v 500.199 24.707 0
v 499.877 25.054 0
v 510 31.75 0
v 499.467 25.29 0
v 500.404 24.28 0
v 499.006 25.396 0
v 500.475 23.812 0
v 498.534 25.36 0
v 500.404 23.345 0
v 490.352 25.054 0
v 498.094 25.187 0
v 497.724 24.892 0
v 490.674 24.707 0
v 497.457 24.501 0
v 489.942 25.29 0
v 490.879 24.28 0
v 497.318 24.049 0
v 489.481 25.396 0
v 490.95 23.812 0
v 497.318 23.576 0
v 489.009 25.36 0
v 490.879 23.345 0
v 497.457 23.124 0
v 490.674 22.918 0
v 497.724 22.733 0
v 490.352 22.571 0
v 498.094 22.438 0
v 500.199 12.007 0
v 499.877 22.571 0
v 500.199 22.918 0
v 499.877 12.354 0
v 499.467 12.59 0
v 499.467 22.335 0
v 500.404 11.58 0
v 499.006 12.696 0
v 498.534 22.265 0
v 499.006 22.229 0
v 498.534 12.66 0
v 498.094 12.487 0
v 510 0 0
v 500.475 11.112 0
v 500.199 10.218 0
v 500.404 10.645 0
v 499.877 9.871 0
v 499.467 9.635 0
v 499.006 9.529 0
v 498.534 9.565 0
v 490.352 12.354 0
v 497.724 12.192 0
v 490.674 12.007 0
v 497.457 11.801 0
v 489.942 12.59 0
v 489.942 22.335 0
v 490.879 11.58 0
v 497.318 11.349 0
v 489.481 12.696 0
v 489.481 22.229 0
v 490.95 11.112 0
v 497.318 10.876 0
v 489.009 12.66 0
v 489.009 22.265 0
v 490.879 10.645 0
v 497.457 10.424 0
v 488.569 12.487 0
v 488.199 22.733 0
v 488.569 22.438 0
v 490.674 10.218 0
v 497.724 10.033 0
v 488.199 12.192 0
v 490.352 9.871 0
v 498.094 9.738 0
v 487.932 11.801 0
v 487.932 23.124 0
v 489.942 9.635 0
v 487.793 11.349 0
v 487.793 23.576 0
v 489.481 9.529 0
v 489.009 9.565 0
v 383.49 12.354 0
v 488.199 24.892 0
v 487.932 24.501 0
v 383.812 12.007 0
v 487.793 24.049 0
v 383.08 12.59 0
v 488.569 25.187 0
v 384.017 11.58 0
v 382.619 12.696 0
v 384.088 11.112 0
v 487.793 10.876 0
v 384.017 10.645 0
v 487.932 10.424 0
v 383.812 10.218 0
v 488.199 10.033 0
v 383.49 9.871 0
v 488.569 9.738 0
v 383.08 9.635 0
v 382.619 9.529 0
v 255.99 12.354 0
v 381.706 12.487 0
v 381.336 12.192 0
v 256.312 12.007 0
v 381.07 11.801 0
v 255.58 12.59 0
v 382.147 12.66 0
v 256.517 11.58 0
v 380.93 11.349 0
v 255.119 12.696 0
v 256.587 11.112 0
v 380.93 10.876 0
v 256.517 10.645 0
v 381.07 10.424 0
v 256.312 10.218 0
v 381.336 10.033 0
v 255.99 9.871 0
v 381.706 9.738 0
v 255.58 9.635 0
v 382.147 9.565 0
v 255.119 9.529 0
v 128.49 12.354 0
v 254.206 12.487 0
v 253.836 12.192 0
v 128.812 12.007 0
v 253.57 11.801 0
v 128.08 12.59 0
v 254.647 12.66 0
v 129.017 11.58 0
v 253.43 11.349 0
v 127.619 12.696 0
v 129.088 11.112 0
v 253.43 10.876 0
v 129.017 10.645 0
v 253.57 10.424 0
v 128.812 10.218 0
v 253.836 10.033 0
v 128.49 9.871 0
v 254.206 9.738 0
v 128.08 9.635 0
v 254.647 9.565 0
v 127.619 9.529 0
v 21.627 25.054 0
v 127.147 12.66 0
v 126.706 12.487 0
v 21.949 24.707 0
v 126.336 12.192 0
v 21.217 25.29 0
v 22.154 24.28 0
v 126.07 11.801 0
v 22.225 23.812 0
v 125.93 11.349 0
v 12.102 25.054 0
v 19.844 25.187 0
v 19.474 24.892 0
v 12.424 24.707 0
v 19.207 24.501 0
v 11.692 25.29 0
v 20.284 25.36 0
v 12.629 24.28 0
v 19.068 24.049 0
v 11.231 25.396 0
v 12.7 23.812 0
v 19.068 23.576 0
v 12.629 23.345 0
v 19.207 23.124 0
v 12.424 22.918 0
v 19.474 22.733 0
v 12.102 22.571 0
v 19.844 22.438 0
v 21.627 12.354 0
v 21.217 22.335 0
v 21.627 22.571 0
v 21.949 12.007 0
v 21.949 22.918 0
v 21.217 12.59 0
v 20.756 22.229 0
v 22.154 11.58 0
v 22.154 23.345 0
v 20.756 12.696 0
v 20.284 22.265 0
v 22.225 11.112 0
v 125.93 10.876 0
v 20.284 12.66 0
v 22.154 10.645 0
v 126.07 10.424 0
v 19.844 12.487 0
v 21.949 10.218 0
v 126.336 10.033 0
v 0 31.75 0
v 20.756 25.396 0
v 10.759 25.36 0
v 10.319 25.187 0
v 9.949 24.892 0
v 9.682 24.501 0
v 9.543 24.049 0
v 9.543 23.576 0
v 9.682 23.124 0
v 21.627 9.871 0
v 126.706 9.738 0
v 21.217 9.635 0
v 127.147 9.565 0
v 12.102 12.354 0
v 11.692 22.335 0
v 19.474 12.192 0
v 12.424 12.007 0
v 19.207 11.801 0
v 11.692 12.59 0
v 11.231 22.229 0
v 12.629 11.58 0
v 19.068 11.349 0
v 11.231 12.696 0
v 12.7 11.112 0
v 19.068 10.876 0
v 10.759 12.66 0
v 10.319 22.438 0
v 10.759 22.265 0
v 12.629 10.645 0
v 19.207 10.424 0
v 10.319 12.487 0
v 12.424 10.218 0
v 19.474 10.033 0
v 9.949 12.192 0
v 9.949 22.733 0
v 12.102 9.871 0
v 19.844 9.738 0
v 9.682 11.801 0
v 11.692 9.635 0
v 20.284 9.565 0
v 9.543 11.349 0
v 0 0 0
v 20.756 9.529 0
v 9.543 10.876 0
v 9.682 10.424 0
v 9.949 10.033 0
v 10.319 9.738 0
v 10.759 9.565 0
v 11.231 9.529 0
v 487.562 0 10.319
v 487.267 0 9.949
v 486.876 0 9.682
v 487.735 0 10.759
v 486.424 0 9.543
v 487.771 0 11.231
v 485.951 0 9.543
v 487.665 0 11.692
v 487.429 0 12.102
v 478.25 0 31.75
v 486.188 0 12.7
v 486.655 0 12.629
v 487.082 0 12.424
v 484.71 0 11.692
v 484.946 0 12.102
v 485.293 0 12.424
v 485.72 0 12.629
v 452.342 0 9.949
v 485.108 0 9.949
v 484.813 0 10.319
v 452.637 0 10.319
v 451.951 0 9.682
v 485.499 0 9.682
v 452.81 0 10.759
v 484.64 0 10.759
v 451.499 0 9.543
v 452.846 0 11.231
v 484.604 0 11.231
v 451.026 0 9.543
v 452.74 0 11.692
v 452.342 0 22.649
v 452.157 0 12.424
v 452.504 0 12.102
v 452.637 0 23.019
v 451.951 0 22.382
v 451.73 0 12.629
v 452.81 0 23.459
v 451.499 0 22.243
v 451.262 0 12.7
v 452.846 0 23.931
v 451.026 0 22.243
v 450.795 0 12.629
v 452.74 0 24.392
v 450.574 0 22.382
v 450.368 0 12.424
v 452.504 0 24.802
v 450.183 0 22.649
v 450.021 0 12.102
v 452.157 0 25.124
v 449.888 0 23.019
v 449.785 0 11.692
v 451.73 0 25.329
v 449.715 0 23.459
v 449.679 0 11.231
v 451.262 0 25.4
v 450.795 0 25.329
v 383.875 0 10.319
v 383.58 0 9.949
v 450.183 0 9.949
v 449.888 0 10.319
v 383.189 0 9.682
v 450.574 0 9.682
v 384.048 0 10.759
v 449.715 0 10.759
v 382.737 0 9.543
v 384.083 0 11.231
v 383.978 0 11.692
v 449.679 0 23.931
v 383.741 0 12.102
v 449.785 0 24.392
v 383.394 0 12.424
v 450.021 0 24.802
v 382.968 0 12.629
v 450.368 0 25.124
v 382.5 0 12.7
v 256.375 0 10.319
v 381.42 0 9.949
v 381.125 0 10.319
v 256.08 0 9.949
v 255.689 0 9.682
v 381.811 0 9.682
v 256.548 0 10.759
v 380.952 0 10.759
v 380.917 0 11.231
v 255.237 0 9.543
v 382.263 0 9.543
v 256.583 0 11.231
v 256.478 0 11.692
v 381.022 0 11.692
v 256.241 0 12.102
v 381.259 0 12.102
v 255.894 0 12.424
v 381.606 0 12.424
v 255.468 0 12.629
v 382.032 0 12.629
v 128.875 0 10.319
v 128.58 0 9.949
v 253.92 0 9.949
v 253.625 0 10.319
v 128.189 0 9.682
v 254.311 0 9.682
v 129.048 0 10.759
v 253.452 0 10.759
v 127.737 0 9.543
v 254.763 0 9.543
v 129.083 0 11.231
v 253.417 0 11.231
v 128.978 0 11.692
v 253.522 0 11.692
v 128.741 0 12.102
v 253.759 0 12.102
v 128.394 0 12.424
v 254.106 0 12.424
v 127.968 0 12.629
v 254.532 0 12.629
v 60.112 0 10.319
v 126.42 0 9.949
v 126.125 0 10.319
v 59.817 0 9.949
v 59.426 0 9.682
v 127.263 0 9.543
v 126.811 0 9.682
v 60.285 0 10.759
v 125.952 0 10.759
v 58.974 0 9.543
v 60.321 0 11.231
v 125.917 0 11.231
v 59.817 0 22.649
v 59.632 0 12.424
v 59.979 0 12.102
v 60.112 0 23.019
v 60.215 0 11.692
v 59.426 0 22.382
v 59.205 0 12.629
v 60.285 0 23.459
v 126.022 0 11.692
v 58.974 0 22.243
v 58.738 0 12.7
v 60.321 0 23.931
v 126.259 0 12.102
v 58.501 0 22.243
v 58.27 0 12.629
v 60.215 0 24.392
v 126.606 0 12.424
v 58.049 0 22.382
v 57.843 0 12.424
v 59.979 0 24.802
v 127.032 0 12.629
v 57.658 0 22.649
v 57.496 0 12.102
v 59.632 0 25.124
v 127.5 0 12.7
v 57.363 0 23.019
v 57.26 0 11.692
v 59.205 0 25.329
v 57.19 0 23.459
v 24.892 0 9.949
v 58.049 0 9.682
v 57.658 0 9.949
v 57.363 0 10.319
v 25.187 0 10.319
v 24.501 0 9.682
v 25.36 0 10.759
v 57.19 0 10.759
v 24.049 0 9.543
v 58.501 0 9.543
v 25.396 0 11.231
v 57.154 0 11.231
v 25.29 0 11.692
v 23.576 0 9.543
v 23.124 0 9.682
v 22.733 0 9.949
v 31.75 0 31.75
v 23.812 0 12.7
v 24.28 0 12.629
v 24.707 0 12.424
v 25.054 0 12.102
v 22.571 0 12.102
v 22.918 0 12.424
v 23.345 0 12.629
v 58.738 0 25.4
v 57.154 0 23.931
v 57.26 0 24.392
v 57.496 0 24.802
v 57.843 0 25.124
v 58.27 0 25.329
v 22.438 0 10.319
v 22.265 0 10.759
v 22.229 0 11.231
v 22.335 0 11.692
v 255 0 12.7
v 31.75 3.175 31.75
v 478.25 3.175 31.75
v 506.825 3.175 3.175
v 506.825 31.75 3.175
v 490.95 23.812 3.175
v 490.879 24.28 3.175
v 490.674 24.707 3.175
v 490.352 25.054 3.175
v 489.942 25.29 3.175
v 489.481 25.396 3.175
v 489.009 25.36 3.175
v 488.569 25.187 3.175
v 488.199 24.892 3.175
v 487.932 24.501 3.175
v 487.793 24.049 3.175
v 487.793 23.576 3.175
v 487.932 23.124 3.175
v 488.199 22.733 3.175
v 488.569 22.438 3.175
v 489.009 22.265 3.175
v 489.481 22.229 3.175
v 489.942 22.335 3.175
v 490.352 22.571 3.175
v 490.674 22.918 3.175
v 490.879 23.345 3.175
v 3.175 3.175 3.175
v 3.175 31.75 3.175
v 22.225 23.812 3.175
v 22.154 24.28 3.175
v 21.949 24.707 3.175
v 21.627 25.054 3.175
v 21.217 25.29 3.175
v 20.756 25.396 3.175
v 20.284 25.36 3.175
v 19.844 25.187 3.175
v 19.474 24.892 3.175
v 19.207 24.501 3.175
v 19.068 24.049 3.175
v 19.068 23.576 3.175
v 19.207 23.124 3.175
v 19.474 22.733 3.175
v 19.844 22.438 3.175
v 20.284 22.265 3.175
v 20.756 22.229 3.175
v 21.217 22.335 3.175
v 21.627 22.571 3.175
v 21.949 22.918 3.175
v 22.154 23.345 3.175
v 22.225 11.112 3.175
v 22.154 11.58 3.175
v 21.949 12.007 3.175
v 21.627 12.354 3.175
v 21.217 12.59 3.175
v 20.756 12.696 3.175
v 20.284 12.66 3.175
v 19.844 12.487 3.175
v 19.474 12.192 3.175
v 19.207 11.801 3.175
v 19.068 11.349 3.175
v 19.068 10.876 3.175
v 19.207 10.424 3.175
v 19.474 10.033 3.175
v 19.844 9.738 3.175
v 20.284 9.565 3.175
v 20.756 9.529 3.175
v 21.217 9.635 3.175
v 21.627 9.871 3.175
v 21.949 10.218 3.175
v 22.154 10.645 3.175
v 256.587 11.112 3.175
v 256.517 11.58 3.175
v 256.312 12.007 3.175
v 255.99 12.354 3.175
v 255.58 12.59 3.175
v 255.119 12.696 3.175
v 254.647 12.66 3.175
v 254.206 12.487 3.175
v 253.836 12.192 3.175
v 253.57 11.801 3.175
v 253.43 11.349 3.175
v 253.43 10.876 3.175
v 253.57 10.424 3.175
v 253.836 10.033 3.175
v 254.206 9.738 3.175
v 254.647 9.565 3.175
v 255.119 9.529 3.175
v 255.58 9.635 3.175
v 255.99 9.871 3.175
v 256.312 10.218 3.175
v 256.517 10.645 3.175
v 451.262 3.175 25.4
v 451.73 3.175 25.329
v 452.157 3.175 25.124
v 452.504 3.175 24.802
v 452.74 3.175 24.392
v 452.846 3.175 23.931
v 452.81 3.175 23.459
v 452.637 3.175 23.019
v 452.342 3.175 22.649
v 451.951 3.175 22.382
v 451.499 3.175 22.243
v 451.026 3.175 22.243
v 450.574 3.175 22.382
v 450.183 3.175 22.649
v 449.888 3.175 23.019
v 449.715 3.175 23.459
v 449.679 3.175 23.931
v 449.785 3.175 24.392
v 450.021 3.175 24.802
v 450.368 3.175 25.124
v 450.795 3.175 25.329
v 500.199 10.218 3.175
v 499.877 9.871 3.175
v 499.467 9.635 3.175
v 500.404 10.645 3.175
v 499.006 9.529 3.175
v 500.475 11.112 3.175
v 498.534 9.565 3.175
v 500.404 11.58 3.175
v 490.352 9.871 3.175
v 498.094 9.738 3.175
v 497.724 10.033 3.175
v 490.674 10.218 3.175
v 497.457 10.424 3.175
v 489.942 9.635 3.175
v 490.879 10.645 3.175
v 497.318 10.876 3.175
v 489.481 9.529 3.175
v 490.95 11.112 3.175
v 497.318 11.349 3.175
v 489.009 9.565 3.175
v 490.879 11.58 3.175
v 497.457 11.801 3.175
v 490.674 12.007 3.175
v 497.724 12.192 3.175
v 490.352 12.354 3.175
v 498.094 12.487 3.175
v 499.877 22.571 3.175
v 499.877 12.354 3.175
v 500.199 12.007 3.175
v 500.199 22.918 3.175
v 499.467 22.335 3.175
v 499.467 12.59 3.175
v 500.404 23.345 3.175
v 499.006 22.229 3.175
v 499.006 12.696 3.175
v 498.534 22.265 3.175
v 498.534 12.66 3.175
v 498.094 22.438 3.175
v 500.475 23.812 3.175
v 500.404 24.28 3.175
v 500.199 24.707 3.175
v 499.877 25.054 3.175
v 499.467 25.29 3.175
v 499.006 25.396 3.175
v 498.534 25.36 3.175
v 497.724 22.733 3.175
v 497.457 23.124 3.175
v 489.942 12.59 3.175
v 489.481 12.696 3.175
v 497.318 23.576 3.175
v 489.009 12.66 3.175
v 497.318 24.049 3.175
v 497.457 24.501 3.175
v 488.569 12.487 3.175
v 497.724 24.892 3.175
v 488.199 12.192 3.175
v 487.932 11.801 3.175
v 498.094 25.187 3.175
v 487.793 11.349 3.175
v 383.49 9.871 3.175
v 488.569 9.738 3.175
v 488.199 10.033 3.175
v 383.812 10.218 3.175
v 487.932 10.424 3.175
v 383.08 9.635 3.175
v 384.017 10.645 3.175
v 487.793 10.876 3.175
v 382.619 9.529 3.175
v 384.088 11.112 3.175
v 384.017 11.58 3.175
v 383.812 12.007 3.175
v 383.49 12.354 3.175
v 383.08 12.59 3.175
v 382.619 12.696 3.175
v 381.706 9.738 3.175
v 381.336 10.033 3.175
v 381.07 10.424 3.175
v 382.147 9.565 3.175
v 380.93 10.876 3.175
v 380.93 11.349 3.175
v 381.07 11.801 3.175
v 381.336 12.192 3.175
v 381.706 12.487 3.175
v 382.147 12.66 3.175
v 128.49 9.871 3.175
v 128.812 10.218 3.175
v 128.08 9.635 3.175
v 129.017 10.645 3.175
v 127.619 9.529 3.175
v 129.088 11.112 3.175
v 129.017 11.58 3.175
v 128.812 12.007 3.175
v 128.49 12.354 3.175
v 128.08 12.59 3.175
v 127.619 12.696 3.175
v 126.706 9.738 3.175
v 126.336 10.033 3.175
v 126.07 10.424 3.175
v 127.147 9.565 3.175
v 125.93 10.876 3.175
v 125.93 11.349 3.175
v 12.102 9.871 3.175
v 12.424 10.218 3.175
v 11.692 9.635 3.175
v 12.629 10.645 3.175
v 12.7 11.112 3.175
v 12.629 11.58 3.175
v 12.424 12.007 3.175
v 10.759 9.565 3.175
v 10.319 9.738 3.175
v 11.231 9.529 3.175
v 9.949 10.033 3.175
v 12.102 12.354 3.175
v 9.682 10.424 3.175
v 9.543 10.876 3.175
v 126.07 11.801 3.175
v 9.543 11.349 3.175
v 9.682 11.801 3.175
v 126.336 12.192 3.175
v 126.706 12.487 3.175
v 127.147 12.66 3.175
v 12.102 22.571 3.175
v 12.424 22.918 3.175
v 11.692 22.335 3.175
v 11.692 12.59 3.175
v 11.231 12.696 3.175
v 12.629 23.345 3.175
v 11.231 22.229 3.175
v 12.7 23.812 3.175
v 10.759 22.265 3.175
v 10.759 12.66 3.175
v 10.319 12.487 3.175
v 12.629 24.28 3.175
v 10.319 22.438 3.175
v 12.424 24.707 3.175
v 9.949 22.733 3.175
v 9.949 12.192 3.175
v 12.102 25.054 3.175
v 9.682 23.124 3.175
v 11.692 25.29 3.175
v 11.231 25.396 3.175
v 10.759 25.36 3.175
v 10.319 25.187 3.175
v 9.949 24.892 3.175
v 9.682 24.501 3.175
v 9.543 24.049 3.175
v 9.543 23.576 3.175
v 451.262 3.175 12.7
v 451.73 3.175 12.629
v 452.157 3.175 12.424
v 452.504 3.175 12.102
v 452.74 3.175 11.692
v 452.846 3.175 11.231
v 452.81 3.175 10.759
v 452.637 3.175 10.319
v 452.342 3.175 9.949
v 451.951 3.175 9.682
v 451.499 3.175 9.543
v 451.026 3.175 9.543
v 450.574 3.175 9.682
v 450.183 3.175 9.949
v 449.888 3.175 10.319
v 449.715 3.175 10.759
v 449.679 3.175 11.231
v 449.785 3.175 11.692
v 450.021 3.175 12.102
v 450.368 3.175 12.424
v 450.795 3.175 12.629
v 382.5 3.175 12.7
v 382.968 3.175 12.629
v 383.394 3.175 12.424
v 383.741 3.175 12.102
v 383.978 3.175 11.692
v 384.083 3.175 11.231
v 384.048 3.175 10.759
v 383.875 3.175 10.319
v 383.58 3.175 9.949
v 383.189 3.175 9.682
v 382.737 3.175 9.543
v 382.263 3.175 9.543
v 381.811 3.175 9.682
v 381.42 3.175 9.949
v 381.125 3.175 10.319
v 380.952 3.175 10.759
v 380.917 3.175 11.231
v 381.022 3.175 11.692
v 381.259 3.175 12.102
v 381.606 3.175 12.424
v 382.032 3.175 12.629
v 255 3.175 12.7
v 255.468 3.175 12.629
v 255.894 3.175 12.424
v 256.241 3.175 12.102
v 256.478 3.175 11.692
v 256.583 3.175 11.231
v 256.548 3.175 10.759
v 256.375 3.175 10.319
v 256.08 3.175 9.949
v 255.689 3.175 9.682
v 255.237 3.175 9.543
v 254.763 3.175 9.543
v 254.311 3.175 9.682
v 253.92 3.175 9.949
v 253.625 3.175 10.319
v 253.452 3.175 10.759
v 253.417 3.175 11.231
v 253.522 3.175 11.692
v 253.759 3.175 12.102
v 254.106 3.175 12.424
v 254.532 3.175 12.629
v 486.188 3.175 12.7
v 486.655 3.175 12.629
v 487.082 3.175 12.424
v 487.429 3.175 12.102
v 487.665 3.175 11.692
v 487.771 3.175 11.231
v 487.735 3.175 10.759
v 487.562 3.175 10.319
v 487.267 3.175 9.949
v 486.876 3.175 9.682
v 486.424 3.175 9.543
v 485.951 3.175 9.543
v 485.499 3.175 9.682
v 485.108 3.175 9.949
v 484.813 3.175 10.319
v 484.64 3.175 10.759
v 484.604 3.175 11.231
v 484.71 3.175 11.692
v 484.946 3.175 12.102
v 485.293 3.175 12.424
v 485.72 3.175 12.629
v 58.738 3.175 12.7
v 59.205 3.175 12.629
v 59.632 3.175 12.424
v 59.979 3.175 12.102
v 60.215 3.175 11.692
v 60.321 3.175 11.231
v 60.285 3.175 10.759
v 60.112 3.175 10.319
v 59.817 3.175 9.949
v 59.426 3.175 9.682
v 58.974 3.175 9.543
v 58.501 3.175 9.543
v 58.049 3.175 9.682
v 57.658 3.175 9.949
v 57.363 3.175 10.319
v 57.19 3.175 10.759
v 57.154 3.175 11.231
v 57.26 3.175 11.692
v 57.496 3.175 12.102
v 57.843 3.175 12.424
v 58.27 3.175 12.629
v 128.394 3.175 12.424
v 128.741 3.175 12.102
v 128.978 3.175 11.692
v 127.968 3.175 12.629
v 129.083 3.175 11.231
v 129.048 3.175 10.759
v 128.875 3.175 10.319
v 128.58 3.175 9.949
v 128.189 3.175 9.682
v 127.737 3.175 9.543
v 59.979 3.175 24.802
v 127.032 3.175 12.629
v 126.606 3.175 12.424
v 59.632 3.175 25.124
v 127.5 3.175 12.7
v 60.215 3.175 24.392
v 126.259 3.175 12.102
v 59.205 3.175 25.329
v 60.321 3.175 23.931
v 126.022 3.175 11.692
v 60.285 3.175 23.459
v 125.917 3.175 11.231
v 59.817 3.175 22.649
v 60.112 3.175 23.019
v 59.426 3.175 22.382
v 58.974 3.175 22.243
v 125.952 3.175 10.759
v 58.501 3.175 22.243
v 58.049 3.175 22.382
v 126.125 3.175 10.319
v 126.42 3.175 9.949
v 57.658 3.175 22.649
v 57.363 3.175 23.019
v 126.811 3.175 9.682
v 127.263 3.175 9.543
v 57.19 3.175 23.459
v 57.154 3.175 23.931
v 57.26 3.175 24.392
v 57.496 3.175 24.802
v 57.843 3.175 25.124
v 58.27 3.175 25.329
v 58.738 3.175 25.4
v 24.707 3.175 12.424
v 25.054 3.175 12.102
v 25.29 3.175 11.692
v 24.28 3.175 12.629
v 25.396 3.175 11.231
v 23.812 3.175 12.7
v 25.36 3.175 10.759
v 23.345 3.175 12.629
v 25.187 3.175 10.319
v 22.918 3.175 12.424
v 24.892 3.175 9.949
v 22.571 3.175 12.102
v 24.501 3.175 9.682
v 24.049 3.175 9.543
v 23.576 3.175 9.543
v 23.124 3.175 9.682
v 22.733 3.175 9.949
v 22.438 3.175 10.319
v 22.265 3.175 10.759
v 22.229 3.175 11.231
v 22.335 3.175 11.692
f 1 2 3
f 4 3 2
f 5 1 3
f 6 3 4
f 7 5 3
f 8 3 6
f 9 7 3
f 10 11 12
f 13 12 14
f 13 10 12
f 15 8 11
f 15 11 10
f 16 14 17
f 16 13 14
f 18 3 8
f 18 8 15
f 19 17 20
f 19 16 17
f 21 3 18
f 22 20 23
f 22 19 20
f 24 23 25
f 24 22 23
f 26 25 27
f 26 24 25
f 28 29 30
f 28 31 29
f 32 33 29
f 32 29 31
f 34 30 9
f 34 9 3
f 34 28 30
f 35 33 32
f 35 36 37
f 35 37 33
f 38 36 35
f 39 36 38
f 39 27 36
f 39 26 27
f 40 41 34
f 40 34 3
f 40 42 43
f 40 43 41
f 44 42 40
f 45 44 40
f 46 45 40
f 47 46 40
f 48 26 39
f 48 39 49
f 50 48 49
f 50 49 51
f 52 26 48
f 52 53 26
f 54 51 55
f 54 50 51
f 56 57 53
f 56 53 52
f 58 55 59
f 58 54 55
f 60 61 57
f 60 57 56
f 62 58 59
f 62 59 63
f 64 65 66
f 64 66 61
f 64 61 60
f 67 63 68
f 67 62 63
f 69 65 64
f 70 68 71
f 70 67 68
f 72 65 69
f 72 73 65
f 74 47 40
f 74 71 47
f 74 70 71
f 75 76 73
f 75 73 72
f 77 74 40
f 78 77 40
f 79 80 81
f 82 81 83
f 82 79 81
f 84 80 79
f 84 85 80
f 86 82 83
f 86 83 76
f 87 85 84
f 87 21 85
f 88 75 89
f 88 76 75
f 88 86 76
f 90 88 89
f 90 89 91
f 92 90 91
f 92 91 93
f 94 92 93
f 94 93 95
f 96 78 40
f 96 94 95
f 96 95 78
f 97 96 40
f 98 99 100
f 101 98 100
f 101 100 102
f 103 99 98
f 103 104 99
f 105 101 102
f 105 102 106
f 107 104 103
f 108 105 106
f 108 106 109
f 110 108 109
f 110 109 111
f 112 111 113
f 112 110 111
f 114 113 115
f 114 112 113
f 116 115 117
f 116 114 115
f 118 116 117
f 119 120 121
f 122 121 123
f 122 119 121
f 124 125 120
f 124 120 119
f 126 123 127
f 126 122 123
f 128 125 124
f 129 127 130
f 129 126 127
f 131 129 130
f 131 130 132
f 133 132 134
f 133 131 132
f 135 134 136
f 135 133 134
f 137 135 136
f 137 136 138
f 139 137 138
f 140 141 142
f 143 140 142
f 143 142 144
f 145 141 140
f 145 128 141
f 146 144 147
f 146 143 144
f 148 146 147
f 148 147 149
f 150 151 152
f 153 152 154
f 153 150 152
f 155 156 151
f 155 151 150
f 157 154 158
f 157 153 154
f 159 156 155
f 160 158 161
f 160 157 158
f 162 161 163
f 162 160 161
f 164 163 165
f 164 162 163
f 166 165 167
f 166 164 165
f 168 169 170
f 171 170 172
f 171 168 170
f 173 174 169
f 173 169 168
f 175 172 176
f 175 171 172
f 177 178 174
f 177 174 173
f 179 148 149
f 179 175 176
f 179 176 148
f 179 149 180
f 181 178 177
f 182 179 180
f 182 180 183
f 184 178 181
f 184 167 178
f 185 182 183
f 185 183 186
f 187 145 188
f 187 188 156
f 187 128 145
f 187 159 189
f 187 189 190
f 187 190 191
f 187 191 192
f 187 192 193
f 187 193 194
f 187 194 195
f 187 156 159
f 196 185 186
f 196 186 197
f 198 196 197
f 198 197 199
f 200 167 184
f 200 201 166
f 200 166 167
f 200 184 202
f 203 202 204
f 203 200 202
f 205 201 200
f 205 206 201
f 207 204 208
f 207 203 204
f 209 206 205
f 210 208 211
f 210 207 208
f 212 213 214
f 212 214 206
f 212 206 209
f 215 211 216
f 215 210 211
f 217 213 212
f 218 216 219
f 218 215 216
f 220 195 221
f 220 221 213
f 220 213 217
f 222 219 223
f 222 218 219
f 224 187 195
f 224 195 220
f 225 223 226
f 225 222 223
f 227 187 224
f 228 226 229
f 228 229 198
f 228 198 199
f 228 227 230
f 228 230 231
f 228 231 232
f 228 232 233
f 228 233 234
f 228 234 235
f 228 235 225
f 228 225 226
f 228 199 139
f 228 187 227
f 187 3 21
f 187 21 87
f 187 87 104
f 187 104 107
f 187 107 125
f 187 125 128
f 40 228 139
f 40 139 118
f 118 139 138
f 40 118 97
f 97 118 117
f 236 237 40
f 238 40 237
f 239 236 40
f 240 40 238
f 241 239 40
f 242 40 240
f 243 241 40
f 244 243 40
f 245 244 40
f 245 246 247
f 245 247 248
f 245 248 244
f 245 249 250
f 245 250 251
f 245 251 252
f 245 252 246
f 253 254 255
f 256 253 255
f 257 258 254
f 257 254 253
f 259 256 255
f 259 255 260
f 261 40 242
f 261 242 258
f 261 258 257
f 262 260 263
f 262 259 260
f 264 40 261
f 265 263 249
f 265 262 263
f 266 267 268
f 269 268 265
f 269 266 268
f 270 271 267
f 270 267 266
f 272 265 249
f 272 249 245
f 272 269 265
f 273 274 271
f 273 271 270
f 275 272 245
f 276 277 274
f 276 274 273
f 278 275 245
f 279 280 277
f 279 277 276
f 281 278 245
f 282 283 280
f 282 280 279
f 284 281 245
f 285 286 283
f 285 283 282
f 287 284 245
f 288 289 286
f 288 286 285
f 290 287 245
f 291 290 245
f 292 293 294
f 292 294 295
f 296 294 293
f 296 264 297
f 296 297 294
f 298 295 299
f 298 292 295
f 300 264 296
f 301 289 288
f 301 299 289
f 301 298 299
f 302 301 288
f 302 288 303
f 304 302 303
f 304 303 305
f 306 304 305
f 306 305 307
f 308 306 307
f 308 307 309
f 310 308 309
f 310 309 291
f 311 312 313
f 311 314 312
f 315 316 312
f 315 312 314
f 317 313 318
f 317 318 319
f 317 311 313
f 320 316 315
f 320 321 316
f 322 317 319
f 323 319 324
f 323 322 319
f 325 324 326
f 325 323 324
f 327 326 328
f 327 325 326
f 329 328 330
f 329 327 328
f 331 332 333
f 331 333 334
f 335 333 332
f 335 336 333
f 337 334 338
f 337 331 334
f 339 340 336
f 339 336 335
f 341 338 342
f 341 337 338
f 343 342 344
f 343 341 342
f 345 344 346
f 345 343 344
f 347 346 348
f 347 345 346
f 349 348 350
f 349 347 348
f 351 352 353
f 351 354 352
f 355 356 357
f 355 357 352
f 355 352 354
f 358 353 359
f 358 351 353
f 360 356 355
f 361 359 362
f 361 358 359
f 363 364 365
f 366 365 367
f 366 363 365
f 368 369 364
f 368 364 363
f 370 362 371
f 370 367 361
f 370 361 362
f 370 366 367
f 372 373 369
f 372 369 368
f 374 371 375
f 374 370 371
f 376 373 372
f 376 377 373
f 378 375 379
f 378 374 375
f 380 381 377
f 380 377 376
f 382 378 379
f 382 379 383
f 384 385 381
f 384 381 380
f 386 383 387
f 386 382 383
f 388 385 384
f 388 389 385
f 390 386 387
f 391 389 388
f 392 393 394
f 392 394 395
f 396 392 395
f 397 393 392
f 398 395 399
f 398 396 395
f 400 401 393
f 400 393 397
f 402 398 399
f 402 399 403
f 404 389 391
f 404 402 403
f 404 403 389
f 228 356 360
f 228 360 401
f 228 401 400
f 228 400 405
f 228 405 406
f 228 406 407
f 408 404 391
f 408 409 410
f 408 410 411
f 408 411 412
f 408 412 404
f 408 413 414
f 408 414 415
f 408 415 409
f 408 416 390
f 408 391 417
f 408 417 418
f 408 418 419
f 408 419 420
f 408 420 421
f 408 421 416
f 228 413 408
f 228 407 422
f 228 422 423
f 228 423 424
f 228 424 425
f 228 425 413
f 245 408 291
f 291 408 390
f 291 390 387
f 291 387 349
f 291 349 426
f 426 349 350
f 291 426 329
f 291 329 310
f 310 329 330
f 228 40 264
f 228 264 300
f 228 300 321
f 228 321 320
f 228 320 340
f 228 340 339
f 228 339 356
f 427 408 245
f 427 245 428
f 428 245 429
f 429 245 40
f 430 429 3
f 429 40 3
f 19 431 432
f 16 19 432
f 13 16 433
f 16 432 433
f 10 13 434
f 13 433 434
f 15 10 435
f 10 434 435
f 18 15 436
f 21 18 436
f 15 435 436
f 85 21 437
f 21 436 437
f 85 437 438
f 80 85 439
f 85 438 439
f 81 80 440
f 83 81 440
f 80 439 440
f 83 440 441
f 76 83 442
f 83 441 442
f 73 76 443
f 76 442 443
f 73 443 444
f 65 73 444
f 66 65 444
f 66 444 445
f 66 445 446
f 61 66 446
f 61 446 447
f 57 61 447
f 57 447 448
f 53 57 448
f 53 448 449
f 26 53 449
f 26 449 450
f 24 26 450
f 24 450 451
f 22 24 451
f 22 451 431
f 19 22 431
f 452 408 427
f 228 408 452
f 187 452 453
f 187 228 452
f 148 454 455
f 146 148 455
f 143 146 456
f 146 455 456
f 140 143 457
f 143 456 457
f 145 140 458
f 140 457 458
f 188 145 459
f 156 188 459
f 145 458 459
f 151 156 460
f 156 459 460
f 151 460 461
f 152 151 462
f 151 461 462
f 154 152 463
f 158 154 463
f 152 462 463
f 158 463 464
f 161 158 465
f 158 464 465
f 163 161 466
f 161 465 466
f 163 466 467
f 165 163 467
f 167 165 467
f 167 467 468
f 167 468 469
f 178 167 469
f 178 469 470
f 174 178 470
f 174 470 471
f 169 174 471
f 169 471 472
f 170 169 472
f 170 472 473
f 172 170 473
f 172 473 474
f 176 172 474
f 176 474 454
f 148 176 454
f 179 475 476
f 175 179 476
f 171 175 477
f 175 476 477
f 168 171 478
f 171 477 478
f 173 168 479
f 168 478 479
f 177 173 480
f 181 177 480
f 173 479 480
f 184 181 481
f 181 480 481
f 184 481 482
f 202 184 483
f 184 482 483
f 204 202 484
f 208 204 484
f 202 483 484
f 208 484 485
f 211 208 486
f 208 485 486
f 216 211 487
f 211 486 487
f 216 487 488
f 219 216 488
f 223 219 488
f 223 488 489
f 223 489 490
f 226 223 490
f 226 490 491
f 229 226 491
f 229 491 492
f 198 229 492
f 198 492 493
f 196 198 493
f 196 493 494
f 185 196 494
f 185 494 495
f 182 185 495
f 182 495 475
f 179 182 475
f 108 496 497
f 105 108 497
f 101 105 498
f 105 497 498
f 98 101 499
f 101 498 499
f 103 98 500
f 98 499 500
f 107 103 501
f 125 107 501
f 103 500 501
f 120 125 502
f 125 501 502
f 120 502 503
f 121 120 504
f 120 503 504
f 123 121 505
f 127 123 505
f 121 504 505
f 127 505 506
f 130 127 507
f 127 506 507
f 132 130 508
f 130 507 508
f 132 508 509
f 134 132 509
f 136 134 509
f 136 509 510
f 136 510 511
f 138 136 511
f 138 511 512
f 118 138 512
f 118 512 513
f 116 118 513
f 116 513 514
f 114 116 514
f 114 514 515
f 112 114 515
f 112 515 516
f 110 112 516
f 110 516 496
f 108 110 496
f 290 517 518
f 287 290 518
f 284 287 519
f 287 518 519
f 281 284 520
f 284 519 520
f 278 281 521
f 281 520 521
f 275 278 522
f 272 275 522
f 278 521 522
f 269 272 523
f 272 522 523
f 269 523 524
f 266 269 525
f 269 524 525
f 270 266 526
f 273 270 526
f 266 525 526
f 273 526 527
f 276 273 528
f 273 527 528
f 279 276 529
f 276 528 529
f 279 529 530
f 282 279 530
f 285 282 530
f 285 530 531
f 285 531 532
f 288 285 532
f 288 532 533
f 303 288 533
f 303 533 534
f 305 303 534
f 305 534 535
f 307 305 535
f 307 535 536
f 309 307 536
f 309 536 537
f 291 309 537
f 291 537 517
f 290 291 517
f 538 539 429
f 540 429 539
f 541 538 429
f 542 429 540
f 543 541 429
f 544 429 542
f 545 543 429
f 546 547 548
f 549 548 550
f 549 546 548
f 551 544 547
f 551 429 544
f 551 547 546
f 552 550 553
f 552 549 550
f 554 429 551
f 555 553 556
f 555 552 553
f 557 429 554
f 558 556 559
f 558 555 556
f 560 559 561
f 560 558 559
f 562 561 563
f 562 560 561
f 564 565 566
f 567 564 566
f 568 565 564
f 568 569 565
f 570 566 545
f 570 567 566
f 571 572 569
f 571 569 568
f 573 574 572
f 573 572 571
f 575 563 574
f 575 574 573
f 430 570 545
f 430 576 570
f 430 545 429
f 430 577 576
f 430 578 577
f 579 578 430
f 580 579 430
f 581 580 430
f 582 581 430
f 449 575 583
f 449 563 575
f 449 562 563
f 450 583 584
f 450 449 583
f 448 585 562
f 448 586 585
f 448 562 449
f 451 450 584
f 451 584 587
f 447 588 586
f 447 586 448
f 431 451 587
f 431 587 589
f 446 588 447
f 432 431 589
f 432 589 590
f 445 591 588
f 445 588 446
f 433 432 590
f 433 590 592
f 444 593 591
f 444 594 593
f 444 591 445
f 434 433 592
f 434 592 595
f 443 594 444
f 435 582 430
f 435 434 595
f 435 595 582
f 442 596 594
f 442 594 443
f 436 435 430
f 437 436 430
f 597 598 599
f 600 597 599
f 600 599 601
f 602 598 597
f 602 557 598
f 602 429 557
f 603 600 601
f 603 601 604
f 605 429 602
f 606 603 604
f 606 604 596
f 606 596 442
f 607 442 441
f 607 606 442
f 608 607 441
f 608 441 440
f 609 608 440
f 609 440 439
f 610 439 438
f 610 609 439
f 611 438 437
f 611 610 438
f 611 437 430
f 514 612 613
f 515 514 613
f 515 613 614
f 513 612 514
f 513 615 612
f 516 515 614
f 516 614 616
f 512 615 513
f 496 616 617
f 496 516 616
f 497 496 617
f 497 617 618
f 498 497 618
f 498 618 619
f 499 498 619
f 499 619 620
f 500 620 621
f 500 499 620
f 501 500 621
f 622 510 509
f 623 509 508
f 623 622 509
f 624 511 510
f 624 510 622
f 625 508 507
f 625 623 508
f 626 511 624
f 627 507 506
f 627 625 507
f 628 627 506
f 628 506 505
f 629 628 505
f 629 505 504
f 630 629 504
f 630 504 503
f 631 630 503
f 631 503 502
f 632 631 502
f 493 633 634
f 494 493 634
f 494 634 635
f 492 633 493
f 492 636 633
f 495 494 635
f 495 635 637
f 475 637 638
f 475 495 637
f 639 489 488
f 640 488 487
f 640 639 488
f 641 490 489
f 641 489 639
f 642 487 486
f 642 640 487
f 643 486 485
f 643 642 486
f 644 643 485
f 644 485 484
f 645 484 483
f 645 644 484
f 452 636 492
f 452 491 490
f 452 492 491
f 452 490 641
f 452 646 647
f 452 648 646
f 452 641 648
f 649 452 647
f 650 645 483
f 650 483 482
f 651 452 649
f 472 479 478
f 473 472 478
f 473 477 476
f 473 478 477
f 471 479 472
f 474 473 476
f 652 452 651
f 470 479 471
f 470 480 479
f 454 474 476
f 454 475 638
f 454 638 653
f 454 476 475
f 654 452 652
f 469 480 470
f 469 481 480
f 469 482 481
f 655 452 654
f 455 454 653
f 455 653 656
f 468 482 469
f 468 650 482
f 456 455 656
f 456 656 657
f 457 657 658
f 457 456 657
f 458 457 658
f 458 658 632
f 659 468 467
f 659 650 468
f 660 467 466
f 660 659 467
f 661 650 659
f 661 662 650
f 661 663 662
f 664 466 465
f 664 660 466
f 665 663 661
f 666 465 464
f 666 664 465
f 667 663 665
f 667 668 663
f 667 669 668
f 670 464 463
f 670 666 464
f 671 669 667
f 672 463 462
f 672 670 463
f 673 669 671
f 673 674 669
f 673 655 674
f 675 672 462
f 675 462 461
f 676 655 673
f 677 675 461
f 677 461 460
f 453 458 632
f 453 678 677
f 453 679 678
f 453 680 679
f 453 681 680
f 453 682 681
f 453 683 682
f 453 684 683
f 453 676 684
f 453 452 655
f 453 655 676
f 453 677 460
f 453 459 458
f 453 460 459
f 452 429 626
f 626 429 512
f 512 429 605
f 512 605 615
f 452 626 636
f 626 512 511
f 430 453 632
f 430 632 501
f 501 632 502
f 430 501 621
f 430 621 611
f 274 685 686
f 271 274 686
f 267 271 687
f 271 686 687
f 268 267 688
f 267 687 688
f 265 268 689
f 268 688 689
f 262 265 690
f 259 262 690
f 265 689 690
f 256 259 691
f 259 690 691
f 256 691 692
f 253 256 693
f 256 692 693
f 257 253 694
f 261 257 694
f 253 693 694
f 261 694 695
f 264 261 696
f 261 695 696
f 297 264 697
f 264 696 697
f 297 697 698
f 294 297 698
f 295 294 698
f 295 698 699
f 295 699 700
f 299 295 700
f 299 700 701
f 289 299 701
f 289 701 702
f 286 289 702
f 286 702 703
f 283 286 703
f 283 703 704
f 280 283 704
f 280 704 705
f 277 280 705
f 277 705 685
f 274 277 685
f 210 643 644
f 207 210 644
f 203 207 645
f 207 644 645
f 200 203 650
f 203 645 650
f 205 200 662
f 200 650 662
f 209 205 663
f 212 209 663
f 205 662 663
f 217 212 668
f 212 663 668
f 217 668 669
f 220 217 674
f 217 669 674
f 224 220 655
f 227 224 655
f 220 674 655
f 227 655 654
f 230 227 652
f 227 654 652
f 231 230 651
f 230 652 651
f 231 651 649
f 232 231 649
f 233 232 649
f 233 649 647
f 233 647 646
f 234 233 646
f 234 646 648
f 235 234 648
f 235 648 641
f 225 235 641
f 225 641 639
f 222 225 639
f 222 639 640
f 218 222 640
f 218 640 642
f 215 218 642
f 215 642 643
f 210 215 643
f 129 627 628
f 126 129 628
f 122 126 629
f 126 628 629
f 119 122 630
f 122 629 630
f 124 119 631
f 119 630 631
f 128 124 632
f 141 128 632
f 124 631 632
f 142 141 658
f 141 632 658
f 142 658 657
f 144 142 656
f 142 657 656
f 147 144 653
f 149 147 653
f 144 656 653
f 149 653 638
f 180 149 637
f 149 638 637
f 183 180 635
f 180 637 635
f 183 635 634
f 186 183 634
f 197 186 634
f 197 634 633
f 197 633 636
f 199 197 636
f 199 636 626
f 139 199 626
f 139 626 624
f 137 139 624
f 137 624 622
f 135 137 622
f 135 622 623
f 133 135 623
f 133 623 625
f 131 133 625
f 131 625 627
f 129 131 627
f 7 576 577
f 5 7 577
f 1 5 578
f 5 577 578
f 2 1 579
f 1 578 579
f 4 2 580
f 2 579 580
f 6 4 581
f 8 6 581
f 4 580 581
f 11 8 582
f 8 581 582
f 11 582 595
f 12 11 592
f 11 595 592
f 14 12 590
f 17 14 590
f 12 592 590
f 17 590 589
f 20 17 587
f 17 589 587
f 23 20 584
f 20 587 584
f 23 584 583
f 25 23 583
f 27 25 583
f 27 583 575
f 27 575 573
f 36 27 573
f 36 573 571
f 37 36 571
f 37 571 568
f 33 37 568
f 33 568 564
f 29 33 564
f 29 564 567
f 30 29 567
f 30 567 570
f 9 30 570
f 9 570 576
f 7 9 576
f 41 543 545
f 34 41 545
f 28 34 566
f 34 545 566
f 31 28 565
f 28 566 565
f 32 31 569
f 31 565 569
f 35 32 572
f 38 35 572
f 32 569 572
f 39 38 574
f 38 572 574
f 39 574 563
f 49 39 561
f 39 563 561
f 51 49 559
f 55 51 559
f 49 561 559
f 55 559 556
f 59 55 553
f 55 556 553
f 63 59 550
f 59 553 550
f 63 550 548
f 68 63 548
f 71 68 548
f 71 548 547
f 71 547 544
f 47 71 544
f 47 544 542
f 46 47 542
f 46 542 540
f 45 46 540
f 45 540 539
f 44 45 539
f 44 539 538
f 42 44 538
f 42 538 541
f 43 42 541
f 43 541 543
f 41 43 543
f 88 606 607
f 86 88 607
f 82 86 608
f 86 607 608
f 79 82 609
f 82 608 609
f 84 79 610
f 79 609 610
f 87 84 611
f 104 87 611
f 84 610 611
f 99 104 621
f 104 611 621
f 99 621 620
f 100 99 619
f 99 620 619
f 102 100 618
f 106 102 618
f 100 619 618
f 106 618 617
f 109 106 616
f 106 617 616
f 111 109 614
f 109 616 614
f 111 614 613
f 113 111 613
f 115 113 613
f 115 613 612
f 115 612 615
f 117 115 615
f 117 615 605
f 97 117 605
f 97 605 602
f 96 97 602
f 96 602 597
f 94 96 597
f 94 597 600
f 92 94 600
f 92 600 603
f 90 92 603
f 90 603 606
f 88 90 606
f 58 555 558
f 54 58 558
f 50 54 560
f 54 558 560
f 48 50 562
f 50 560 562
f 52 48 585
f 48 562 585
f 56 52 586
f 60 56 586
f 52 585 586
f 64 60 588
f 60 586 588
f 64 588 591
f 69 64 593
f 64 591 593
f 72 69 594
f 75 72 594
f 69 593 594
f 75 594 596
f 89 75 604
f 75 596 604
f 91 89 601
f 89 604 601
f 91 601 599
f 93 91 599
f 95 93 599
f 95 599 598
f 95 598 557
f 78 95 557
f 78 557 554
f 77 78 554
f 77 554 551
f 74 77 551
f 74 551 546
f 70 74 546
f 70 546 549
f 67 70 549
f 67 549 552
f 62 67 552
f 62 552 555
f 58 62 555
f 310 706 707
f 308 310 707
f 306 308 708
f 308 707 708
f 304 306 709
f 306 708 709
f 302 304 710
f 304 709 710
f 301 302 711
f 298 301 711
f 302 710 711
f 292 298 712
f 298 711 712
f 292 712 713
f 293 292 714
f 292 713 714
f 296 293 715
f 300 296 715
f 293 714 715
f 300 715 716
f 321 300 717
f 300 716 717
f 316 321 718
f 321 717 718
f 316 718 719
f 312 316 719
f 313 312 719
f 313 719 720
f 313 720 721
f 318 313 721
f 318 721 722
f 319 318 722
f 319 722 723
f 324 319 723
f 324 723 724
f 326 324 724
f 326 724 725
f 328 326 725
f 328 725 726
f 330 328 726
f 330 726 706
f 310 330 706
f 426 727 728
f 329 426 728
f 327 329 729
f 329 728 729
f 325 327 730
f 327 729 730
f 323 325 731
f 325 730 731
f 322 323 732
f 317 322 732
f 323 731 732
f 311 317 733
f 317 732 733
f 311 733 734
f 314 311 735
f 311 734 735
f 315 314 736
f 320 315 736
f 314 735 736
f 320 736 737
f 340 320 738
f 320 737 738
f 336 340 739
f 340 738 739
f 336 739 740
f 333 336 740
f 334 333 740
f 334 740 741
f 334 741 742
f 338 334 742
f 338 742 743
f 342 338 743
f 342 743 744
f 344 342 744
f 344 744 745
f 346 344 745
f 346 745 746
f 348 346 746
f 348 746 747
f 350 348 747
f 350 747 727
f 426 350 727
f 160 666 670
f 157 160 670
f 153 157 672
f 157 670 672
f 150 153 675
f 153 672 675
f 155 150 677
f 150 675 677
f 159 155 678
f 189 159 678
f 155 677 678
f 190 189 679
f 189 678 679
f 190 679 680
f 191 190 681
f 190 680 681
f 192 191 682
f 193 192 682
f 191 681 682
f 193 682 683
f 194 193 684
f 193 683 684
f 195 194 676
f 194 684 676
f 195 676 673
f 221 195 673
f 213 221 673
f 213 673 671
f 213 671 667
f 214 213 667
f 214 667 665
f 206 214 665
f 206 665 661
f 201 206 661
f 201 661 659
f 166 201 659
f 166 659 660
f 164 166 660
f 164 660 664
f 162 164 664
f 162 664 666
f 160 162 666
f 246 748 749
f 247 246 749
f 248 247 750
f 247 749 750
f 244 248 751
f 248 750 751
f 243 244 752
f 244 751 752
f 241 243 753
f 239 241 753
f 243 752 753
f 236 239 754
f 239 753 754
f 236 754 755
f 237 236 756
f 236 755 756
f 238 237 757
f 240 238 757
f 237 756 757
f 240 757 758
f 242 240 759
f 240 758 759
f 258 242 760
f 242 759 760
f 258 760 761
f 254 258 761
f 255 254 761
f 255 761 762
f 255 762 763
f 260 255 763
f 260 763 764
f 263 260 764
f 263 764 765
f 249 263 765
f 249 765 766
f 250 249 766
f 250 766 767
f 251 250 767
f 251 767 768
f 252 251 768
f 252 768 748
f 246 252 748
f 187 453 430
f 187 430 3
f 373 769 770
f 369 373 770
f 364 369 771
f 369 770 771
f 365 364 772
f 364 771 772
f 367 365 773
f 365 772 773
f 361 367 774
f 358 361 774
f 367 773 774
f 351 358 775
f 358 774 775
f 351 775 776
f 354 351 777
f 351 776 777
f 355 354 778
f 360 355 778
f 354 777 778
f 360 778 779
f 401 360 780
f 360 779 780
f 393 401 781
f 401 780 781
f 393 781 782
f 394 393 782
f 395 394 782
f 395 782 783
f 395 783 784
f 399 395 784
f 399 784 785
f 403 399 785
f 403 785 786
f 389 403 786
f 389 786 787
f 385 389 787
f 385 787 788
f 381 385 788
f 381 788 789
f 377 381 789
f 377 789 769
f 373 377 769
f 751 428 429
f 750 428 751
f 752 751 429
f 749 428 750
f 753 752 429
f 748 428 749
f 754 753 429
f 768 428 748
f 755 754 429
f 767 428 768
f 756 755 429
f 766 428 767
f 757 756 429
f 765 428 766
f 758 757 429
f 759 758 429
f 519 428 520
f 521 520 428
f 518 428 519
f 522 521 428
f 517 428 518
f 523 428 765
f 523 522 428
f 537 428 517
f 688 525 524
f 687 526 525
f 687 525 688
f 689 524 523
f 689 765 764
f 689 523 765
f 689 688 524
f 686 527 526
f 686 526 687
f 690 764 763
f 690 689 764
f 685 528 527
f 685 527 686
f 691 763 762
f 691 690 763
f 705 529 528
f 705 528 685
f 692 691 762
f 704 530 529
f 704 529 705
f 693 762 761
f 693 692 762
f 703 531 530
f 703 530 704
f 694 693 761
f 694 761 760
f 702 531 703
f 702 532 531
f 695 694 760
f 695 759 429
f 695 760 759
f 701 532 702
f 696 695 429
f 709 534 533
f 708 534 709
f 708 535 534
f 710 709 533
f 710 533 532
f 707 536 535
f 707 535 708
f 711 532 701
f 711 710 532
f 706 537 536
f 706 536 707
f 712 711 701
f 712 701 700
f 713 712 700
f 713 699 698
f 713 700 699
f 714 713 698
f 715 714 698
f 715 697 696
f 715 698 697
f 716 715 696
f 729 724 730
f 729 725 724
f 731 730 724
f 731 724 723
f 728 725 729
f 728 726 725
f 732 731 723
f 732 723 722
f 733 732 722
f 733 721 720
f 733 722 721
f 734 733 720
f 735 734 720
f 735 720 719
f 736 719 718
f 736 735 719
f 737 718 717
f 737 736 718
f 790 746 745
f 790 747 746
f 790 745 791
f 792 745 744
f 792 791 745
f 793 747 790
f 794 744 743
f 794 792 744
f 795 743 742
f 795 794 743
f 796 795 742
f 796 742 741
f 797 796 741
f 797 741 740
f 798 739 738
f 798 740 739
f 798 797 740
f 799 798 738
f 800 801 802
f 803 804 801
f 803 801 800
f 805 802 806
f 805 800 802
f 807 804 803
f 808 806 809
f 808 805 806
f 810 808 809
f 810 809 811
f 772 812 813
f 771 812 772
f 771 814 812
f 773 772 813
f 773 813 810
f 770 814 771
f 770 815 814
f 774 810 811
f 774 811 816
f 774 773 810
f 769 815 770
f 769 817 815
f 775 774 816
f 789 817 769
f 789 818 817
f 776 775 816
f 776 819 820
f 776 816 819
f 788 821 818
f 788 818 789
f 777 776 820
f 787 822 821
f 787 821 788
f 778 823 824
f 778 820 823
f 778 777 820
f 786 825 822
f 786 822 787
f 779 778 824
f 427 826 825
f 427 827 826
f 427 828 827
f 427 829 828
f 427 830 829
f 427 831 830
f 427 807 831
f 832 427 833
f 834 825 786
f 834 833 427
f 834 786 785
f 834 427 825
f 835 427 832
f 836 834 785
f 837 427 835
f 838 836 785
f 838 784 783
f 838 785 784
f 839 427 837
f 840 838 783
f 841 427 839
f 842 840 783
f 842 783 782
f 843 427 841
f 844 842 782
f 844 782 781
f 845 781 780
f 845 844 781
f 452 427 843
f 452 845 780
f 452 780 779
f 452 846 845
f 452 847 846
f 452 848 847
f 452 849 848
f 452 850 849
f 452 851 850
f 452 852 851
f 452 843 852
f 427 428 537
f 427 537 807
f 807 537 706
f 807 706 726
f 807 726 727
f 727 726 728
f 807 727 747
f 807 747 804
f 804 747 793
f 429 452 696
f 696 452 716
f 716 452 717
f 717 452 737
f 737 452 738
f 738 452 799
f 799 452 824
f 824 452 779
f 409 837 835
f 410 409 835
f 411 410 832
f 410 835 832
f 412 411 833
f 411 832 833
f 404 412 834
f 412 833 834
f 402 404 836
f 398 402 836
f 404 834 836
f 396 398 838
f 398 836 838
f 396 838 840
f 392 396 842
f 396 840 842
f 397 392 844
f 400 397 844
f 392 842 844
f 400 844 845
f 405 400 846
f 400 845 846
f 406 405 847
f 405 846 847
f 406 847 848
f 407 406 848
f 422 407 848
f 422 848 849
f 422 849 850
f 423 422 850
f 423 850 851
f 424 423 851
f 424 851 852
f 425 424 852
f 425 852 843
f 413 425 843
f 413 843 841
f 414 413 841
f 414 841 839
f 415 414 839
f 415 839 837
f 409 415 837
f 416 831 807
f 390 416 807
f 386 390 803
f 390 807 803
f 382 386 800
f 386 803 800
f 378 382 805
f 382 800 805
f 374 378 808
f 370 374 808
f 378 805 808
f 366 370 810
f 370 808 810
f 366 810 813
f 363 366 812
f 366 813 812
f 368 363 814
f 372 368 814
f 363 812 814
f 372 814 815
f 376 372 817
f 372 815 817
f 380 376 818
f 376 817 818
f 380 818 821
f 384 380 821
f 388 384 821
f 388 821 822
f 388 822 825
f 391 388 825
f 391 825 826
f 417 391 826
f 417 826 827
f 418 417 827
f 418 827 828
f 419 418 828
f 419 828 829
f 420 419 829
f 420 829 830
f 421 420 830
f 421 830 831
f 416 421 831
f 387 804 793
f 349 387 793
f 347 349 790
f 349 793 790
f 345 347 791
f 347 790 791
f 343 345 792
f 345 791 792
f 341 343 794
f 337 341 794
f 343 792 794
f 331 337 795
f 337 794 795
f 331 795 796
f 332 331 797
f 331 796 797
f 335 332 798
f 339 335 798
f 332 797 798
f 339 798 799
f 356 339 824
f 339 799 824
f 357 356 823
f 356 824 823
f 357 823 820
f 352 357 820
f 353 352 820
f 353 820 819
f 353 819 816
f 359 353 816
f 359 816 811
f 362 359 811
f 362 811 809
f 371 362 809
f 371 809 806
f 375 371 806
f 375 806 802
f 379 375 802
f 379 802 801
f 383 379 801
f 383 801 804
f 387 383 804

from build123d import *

# Parameters (mm, degrees)
BOSS_EXTRUDE1_DEPTH           = 510
CHAMFER6_SIZE                 = 31.75
CHAMFER7_SIZE                 = 31.75
TOPHOLES_SKETCH3_R            = 1.5875
TOPHOLES_CUT_EXTRUDE2_DEPTH   = 512.785690622
FRONTHOLES_SKETCH4_R          = 1.5875
FRONTHOLES_CUT_EXTRUDE3_DEPTH = 512.785690622


with BuildPart() as part:
    # Sketch1 → Boss-Extrude1 (new body)
    with BuildSketch(Plane(origin=(0, 0, 0), x_dir=(0, 0, -1), z_dir=(1, 0, 0))):
        Polygon((0, 0), (-31.75, 0), (-31.75, 3.175), (-3.175, 3.175), (-3.175, 31.75), (0, 31.75), align=None)
    extrude(amount=BOSS_EXTRUDE1_DEPTH)

    # Chamfer6
    chamfer6_edges = [part.edges().sort_by_distance(p)[0] for p in [
        (510, 1.5875, 31.75),
    ]]
    chamfer(chamfer6_edges, length=CHAMFER6_SIZE - 0.0001)  # a hair under: the kernel refuses the full size

    # Chamfer7
    chamfer7_edges = [part.edges().sort_by_distance(p)[0] for p in [
        (0, 1.5875, 31.75),
    ]]
    chamfer(chamfer7_edges, length=CHAMFER7_SIZE - 0.0001)  # a hair under: the kernel refuses the full size

    # TopHoles-Sketch3 → TopHoles-Cut-Extrude2 (cut, through all)
    with BuildSketch(Plane(origin=(0, 3.175, 0), x_dir=(1, 0, 0), z_dir=(0, 1, 0))):
        with Locations(Location((58.7375, -23.8125, 0), (0, 0, 270))):
            Circle(TOPHOLES_SKETCH3_R)
        with Locations(Location((451.2625, -23.8125, 0), (0, 0, 270))):
            Circle(TOPHOLES_SKETCH3_R)
        with Locations(Location((451.2625, -11.1125, 0), (0, 0, 270))):
            Circle(TOPHOLES_SKETCH3_R)
        with Locations(Location((58.7375, -11.1125, 0), (0, 0, 270))):
            Circle(TOPHOLES_SKETCH3_R)
        with Locations(Location((486.1875, -11.1125, 0), (0, 0, 270))):
            Circle(TOPHOLES_SKETCH3_R)
        with Locations(Location((23.8125, -11.1125, 0), (0, 0, 270))):
            Circle(TOPHOLES_SKETCH3_R)
        with Locations(Location((127.5, -11.1125, 0), (0, 0, 270))):
            Circle(TOPHOLES_SKETCH3_R)
        with Locations(Location((255, -11.1125, 0), (0, 0, 270))):
            Circle(TOPHOLES_SKETCH3_R)
        with Locations(Location((382.5, -11.1125, 0), (0, 0, 270))):
            Circle(TOPHOLES_SKETCH3_R)
    extrude(amount=-TOPHOLES_CUT_EXTRUDE2_DEPTH, mode=Mode.SUBTRACT)

    # FrontHoles-Sketch4 → FrontHoles-Cut-Extrude3 (cut, through all)
    with BuildSketch(Plane.XY.offset(3.175)):
        with Locations((11.1125, 23.8125)):
            Circle(FRONTHOLES_SKETCH4_R)
        with Locations((489.3625, 23.8125)):
            Circle(FRONTHOLES_SKETCH4_R)
        with Locations((20.6375, 23.8125)):
            Circle(FRONTHOLES_SKETCH4_R)
        with Locations((498.8875, 23.8125)):
            Circle(FRONTHOLES_SKETCH4_R)
        with Locations((11.1125, 11.1125)):
            Circle(FRONTHOLES_SKETCH4_R)
        with Locations((20.6375, 11.1125)):
            Circle(FRONTHOLES_SKETCH4_R)
        with Locations((489.3625, 11.1125)):
            Circle(FRONTHOLES_SKETCH4_R)
        with Locations((498.8875, 11.1125)):
            Circle(FRONTHOLES_SKETCH4_R)
        with Locations((127.5, 11.1125)):
            Circle(FRONTHOLES_SKETCH4_R)
        with Locations((255, 11.1125)):
            Circle(FRONTHOLES_SKETCH4_R)
        with Locations((382.5, 11.1125)):
            Circle(FRONTHOLES_SKETCH4_R)
    extrude(amount=-FRONTHOLES_CUT_EXTRUDE3_DEPTH, mode=Mode.SUBTRACT)


solid = part.part
